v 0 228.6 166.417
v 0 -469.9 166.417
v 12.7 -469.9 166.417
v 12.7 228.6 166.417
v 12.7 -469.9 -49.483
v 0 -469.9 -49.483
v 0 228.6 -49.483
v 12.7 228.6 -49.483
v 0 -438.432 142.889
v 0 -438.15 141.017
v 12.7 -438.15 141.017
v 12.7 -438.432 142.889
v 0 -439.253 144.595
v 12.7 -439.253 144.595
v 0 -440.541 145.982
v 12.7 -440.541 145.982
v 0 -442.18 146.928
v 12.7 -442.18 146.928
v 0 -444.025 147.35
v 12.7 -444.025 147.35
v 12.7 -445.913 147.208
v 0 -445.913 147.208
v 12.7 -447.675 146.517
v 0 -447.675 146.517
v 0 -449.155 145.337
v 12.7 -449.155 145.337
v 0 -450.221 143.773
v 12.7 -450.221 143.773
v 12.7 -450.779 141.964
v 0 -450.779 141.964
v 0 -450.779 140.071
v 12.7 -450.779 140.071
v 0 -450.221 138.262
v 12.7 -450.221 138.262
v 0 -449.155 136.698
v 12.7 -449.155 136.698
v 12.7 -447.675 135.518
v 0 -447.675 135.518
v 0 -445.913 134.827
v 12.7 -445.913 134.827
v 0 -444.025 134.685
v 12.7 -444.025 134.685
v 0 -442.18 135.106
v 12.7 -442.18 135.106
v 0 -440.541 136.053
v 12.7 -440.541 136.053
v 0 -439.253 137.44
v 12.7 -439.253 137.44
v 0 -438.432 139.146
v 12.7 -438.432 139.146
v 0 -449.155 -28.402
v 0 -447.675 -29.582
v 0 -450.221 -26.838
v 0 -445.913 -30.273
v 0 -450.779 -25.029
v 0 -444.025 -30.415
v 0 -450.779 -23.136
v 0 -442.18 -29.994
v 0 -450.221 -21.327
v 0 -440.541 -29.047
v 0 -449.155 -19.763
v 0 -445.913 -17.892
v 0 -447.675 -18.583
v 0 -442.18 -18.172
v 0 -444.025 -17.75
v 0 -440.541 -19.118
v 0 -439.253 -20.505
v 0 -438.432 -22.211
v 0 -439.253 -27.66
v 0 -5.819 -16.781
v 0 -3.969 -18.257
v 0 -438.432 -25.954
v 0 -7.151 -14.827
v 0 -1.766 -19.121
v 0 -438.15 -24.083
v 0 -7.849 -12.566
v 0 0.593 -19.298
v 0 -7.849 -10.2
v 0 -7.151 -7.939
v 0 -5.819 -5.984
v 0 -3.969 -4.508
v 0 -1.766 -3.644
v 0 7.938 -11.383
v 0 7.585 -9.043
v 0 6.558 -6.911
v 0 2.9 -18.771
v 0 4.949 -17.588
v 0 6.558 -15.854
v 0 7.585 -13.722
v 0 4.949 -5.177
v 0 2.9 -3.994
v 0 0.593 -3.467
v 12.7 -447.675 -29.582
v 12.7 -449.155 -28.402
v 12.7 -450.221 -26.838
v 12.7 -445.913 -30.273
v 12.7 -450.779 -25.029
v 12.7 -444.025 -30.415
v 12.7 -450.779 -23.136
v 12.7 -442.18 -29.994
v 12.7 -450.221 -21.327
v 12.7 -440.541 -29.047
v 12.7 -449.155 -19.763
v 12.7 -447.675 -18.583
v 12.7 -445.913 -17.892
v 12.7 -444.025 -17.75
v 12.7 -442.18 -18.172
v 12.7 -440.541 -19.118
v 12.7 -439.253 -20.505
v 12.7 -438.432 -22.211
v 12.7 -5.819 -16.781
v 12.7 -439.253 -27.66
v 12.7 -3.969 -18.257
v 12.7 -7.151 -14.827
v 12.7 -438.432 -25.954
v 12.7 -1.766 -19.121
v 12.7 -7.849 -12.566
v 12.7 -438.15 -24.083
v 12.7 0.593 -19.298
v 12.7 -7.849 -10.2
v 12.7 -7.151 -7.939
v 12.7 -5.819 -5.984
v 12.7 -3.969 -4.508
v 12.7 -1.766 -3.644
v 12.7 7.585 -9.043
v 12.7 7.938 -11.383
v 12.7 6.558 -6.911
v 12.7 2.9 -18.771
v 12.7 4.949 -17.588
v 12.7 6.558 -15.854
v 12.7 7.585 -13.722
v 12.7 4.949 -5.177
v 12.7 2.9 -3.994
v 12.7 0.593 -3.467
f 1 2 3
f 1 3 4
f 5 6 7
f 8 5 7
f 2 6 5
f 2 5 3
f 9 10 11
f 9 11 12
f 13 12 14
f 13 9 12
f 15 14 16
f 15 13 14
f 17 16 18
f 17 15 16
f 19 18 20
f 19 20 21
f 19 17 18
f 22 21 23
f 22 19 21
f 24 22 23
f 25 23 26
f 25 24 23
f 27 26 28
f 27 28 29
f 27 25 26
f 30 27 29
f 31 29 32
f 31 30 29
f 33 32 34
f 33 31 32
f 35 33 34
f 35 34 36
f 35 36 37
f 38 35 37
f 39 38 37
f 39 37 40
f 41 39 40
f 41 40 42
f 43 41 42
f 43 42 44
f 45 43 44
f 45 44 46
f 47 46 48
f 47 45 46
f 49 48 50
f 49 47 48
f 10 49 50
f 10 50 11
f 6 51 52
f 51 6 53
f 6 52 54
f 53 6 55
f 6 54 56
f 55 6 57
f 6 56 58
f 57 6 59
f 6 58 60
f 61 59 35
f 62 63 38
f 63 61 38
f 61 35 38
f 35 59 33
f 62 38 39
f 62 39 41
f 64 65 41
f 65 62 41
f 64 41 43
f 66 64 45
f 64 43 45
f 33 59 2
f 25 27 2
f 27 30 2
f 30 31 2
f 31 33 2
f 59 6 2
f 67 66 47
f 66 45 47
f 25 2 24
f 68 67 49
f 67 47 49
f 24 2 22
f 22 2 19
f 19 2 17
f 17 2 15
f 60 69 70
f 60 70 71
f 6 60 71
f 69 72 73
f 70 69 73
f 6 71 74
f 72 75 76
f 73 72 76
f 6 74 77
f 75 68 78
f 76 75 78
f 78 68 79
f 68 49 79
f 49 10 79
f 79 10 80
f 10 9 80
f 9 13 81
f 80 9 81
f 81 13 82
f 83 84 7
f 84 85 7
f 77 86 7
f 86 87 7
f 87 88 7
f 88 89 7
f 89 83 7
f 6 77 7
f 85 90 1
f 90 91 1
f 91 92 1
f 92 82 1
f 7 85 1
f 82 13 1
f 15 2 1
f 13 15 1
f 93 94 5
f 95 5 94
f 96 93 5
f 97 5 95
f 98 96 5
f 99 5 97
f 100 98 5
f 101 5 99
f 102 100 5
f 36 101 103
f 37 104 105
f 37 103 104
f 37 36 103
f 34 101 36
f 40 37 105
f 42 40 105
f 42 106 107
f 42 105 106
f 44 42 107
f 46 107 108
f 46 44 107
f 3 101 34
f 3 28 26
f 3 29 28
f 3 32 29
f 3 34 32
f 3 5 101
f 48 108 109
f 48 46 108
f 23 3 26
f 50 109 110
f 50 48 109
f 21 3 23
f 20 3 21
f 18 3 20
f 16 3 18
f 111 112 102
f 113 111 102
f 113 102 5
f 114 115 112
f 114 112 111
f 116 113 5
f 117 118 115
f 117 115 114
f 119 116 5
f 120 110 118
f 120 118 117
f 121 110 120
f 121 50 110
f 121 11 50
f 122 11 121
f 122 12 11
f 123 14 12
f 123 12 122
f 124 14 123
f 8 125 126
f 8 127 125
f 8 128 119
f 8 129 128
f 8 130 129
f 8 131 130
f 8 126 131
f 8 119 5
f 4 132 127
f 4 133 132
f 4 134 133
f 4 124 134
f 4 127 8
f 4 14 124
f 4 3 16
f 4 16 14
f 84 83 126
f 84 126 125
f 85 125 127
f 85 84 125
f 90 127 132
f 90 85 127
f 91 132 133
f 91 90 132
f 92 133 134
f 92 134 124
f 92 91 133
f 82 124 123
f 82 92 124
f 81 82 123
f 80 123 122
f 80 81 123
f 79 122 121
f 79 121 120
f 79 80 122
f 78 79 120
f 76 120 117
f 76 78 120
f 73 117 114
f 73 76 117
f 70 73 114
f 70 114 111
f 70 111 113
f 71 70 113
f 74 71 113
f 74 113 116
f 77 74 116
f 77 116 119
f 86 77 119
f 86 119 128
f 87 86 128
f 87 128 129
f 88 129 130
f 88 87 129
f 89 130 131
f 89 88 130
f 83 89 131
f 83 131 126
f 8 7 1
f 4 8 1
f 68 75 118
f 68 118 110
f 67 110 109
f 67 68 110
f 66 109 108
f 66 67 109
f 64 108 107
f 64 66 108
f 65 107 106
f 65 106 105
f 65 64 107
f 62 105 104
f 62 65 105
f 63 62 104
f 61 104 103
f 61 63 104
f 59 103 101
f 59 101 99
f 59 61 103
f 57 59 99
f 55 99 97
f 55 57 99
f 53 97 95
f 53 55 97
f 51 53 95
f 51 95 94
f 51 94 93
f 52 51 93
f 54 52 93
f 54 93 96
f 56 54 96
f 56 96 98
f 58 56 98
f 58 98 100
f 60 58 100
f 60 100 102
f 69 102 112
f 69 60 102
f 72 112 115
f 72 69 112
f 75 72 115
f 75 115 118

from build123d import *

# Parameters (mm, degrees)
F0_W     = 698.5
F0_H     = 215.9
F0_R     = 6.35
F0_R_2   = 7.9375
F1_DEPTH = 12.7


with BuildPart() as f1:
    # F0 (on Right) → F1 (new body)
    with BuildSketch(Plane.YZ):
        with Locations((-120.65, 58.467444)):
            Rectangle(F0_W, F0_H)
        with Locations((-444.5, -24.082556)):
            Circle(F0_R, mode=Mode.SUBTRACT)
        with Locations((0, -11.382556)):
            Circle(F0_R_2, mode=Mode.SUBTRACT)
        with Locations((-444.5, 141.017444)):
            Circle(F0_R, mode=Mode.SUBTRACT)
    extrude(amount=F1_DEPTH)


solid = f1.part
